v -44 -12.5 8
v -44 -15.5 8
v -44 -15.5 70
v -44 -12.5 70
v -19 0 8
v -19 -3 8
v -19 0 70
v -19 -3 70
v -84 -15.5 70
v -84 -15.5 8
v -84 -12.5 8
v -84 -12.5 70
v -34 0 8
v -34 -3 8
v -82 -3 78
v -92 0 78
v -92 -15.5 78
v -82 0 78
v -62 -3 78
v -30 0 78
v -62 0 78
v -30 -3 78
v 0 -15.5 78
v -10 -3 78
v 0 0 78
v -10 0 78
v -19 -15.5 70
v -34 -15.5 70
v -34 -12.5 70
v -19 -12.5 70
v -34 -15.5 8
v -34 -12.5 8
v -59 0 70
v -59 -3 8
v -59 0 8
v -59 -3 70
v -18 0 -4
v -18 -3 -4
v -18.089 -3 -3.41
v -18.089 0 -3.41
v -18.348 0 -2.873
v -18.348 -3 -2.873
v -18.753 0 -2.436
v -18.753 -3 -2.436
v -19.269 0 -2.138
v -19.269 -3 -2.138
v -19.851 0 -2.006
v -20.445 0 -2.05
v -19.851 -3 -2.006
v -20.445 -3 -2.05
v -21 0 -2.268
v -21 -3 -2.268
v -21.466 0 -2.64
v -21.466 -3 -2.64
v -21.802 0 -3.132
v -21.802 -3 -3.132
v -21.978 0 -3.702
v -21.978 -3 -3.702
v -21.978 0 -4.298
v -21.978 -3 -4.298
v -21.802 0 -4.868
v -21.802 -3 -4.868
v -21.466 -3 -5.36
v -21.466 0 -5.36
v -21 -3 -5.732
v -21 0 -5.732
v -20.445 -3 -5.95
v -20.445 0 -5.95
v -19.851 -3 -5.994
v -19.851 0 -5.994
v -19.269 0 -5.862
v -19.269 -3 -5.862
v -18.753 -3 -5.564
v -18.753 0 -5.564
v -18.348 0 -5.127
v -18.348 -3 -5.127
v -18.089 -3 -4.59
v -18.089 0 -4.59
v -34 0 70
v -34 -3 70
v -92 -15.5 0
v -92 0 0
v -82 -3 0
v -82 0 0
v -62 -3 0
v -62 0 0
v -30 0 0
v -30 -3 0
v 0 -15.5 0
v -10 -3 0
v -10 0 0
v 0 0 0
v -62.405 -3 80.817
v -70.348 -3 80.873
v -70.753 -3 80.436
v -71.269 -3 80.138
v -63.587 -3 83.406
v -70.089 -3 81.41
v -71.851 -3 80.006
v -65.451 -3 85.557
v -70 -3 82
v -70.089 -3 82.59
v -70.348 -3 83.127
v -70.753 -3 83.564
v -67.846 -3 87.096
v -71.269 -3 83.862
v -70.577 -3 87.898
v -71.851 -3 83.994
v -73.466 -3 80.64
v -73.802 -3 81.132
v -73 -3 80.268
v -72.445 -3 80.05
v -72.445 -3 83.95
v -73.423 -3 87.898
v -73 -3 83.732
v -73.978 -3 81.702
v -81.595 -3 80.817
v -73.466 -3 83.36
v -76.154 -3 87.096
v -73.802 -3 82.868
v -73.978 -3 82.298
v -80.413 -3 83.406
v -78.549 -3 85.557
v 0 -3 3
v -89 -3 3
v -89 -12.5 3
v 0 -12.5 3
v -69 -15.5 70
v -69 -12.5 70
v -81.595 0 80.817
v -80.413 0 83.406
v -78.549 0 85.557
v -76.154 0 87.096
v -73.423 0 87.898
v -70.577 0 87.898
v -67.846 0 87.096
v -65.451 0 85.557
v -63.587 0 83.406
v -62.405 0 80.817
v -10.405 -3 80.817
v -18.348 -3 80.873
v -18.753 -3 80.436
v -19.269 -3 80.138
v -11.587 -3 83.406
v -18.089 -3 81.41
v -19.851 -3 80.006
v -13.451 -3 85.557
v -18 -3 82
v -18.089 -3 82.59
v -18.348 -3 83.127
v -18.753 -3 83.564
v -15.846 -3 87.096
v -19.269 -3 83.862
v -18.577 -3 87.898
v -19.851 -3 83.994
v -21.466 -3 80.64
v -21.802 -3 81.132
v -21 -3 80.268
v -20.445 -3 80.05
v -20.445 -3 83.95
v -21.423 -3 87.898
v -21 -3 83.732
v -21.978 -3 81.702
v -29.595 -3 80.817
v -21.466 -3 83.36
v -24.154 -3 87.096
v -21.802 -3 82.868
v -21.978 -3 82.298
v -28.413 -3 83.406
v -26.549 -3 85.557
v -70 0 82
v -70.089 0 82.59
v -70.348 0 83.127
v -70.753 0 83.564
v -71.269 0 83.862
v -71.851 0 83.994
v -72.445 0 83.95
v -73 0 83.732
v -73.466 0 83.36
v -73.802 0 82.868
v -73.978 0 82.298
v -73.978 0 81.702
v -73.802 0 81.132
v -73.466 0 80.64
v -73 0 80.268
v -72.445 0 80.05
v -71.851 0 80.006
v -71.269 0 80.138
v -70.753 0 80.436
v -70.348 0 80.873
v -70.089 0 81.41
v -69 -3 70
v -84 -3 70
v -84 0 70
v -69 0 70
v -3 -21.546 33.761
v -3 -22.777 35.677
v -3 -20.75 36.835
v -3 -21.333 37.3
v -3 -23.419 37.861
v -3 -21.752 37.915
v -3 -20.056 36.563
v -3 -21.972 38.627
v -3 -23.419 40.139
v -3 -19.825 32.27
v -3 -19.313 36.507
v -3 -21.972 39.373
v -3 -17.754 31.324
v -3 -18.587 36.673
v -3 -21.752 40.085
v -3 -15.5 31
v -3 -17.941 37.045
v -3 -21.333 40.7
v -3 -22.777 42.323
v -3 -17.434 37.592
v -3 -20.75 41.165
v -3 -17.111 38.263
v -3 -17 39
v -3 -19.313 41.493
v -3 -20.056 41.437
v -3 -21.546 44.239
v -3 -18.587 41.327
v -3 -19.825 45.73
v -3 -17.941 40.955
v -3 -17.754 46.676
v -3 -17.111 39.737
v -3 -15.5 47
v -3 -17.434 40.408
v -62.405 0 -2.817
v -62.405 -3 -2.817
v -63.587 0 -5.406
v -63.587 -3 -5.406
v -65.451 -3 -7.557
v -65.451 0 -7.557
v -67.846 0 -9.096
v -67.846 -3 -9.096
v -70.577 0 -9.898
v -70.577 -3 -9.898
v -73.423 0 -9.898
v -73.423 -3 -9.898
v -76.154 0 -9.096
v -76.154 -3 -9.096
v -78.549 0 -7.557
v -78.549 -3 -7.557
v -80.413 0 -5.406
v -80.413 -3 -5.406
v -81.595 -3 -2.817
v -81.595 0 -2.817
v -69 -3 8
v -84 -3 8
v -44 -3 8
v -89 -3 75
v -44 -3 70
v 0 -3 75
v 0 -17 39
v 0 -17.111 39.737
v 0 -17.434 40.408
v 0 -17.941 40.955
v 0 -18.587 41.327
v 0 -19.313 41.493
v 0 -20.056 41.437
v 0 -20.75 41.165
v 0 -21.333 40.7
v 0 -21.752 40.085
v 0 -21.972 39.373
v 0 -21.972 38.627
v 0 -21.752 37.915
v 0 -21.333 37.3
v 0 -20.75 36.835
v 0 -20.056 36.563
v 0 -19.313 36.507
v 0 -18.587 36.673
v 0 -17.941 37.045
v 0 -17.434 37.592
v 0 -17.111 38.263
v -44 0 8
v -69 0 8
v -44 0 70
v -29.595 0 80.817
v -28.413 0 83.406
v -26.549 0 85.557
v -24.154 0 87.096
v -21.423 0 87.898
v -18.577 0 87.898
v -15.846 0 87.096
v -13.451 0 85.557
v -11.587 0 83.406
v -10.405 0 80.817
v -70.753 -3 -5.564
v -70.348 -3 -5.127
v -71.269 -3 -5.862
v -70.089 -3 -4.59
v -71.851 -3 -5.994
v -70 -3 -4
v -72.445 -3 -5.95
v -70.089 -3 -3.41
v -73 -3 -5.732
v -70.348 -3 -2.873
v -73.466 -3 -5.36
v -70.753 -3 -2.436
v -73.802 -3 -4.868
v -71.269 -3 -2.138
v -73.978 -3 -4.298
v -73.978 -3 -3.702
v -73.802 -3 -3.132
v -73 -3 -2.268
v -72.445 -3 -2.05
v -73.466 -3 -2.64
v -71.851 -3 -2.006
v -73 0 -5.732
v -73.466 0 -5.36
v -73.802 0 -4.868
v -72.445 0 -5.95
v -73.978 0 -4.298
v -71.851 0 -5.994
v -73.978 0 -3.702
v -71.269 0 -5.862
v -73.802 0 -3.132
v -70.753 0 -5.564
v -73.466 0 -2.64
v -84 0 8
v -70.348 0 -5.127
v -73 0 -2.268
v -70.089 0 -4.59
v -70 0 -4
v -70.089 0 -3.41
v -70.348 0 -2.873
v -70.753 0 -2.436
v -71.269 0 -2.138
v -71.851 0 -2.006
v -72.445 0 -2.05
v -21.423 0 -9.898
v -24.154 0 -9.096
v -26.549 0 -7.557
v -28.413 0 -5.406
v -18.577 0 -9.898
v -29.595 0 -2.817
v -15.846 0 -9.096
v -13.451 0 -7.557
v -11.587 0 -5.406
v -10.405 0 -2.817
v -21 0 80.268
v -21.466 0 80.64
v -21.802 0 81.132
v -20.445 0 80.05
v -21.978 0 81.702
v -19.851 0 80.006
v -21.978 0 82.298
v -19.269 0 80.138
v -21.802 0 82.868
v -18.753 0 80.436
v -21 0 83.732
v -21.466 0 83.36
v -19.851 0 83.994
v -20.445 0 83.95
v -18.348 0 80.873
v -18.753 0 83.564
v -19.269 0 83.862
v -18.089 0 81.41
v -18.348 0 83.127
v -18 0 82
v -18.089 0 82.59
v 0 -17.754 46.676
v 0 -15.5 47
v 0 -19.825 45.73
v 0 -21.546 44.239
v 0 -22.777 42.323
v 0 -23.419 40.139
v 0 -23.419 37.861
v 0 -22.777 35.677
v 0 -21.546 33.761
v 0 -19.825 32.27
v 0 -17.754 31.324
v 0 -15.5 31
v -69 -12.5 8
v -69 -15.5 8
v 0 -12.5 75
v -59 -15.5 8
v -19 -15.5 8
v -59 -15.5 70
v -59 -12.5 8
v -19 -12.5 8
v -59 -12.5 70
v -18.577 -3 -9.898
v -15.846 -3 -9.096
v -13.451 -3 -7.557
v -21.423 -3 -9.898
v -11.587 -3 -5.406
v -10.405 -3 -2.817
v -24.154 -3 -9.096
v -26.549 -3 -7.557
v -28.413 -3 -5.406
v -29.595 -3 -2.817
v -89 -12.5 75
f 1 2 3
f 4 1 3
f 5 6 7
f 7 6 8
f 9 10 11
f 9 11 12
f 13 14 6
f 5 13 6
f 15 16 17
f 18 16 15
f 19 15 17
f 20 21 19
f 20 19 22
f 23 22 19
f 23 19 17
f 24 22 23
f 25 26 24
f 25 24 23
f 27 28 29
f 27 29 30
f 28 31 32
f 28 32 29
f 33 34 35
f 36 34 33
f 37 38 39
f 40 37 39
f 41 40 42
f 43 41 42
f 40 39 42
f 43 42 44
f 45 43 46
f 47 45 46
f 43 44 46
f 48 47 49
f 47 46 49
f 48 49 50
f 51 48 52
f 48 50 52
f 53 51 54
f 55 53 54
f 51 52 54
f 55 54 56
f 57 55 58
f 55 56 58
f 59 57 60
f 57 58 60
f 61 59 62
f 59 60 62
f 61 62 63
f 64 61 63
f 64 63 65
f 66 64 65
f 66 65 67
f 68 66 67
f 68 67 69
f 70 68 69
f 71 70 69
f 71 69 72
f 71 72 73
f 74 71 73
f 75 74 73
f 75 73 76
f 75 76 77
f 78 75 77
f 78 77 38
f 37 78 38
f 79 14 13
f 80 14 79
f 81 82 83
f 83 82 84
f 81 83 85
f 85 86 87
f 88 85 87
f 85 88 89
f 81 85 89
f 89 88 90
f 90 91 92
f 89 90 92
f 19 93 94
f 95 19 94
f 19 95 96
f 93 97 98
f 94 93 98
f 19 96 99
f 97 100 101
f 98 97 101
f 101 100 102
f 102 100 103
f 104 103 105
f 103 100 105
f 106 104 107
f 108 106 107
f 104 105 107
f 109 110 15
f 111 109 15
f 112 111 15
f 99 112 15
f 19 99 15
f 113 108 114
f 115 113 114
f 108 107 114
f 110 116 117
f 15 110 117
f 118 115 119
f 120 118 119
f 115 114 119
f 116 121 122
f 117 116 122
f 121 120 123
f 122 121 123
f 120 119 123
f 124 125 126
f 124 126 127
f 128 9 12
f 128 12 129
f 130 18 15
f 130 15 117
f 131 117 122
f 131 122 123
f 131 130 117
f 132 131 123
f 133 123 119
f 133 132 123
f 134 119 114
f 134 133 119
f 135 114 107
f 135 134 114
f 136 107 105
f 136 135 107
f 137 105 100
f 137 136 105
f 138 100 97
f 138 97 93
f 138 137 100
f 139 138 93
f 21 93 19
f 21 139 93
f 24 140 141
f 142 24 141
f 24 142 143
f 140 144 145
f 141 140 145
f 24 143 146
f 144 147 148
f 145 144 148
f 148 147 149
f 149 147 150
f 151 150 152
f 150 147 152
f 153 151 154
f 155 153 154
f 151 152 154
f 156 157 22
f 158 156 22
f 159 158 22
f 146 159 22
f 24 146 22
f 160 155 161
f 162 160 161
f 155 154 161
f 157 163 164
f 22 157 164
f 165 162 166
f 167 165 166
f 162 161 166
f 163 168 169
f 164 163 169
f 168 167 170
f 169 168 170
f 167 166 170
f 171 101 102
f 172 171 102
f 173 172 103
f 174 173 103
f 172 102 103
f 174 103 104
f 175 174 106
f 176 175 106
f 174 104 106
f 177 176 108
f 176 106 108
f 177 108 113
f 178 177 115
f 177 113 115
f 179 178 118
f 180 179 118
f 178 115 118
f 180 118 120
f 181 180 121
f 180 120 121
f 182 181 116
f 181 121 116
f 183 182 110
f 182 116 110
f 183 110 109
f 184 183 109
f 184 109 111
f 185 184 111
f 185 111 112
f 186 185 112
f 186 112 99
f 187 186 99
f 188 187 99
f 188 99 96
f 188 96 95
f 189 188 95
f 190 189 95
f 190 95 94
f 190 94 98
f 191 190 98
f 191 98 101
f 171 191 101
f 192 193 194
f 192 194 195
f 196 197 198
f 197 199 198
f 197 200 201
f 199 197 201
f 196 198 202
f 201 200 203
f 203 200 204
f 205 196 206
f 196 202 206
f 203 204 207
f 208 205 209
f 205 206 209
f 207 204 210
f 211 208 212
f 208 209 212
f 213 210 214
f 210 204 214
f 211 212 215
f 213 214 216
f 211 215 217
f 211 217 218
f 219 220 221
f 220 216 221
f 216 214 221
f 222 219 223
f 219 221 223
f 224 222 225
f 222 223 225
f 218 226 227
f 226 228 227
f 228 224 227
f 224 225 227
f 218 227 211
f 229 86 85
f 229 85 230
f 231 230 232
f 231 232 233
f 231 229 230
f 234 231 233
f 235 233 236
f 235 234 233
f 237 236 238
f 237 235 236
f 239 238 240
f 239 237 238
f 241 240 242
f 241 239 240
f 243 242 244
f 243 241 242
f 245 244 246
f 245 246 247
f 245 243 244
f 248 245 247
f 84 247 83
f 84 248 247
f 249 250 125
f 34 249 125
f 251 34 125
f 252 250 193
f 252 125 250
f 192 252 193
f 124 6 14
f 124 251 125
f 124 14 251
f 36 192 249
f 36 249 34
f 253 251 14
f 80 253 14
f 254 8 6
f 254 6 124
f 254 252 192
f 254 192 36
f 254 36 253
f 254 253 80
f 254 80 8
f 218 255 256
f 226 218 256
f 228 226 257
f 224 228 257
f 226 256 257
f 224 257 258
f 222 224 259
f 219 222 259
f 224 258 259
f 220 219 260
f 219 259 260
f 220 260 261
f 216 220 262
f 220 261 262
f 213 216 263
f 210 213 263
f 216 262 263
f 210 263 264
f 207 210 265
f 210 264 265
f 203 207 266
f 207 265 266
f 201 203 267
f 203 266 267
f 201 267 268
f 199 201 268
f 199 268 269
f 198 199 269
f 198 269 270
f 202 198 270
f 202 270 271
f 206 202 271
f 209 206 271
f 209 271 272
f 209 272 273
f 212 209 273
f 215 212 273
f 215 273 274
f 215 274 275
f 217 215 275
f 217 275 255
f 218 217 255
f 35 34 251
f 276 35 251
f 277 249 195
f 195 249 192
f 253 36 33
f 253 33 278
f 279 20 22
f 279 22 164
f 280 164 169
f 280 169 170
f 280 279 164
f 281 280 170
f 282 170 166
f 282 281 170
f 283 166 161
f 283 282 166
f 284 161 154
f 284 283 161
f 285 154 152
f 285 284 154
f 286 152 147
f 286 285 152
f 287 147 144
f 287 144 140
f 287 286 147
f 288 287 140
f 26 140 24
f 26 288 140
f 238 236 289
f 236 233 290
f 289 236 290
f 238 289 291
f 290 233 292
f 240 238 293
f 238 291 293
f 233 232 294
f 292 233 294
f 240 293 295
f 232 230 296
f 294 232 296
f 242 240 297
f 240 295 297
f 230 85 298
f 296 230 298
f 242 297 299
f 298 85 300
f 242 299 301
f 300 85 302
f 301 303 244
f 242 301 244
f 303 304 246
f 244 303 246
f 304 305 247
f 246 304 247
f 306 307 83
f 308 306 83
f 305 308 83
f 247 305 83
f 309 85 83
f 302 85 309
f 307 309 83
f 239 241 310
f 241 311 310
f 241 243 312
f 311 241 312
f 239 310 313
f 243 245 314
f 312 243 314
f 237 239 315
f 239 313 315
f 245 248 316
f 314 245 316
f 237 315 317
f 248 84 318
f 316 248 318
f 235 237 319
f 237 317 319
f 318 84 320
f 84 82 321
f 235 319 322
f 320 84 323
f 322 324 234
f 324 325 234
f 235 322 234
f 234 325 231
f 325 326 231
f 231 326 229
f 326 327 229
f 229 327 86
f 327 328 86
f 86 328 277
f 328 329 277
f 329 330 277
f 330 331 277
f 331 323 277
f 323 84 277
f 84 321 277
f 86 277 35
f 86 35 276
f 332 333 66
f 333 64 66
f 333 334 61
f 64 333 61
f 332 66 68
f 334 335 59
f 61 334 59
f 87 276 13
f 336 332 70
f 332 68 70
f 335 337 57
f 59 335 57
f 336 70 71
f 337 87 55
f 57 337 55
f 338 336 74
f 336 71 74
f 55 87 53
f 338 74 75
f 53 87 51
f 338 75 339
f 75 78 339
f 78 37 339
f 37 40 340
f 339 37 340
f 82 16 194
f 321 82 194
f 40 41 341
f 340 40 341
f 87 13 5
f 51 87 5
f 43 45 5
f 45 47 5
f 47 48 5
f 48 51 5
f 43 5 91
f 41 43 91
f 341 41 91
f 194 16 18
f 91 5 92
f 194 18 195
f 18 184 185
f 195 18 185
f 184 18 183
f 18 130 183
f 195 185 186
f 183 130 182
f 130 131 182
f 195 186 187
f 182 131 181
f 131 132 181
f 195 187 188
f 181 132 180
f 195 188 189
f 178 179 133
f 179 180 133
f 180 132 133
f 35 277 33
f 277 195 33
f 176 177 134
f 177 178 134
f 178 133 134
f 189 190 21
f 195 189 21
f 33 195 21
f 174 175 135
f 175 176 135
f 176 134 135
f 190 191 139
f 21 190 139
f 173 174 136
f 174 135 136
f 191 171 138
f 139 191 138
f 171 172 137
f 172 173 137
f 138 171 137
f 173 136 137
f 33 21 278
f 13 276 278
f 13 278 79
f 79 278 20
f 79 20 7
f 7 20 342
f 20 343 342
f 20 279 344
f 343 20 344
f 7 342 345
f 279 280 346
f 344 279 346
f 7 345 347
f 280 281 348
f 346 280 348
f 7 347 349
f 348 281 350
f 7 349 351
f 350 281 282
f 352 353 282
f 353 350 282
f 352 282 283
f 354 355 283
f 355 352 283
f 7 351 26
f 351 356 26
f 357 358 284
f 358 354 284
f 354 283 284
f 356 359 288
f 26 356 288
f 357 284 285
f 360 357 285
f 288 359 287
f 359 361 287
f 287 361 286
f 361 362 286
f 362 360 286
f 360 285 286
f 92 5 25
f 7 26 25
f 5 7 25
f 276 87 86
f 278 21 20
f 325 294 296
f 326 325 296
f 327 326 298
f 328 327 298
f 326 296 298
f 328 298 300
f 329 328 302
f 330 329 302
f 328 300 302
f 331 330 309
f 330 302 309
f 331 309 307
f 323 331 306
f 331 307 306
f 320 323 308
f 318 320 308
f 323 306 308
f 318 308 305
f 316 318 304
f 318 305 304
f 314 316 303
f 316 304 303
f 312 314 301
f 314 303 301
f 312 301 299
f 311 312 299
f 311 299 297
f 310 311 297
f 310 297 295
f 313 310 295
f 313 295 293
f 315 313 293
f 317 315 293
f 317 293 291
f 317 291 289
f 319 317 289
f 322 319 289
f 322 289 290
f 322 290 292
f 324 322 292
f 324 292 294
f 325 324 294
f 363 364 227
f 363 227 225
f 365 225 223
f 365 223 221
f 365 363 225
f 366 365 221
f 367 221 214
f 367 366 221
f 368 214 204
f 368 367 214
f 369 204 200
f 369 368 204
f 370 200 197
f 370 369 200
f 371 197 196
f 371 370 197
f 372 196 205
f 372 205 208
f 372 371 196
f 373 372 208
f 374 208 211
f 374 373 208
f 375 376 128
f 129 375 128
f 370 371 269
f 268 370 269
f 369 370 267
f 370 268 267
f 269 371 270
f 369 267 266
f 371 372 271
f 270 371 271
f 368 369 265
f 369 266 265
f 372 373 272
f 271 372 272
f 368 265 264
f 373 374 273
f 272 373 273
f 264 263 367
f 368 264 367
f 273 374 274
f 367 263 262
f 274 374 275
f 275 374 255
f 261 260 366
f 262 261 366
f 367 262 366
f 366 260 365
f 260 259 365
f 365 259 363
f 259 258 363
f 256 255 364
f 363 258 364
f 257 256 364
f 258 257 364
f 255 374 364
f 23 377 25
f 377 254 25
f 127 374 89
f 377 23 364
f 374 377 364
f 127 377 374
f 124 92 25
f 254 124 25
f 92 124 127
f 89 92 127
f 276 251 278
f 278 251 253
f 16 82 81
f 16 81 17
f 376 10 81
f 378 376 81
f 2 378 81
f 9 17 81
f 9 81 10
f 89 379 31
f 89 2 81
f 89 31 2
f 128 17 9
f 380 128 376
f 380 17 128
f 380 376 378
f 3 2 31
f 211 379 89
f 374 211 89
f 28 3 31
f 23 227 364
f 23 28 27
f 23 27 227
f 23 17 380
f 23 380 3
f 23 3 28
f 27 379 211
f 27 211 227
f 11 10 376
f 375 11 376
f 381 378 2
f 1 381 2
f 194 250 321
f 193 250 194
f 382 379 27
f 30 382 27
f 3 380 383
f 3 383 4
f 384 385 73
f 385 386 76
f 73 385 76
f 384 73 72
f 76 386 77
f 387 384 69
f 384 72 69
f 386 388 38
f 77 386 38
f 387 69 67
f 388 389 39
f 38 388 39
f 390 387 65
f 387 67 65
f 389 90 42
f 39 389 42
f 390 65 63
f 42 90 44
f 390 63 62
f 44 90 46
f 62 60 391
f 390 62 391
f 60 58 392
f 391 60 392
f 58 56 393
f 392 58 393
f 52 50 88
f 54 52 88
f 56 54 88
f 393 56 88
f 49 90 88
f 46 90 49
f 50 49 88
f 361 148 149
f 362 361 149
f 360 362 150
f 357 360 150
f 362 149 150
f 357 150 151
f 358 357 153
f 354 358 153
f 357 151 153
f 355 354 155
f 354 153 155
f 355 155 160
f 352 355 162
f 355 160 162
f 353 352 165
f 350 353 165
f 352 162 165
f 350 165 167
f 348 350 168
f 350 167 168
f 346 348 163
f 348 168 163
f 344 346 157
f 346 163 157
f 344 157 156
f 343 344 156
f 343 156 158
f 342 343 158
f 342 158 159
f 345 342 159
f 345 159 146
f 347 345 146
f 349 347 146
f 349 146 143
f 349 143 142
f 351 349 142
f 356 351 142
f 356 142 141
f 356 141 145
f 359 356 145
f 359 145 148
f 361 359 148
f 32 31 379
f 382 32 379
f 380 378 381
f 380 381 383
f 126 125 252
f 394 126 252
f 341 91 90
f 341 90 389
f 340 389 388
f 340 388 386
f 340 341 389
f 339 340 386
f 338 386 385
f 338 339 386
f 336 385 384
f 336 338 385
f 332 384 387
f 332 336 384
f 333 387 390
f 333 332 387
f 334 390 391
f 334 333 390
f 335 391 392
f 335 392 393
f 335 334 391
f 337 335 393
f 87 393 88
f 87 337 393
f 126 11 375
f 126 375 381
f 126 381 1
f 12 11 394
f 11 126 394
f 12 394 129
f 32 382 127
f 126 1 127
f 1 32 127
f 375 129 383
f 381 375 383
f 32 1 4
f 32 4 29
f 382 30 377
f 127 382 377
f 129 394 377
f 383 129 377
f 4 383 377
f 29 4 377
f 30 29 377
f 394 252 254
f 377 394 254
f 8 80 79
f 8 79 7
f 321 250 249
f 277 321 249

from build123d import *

# Parameters (mm, degrees)
F0_W      = 92
F0_H      = 78
F1_DEPTH  = 15.5
F2_T      = -3
F4_DEPTH  = 3
F5_R      = 2
F6_DEPTH  = 25
F7_W      = 15
F7_H      = 62
F8_DEPTH  = 25
F10_DEPTH = 3
F11_R     = 2.5
F12_DEPTH = 5


# Not quite as in the source:
# - a feature names something its author has since deleted; it is built from what else it names


with BuildPart() as f1:
    # F0 (on Front) → F1 (new body)
    with BuildSketch(Plane.XZ):
        with Locations((-46, 39)):
            Rectangle(F0_W, F0_H)
    extrude(amount=F1_DEPTH)

    # F2
    f2_openings = [f1.faces().sort_by_distance(p)[0] for p in [
        (0, -7.75, 39),
    ]]
    offset(amount=F2_T, openings=f2_openings)

    # F3 (on face) → F4 (join)
    with BuildSketch(Plane(origin=(0, 0, 0), x_dir=(-1, 0, 0), z_dir=(0, 1, 0))):
        with BuildLine():
            Line((62, 78), (82, 78))
            ThreePointArc((82, 78), (72, 88), (62, 78))
        make_face()
        with BuildLine():
            ThreePointArc((62, 0), (72, -10), (82, 0))
            Line((82, 0), (62, 0))
        make_face()
        with BuildLine():
            Line((10, 78), (30, 78))
            ThreePointArc((30, 78), (20, 88), (10, 78))
        make_face()
        with BuildLine():
            ThreePointArc((10, 0), (20, -10), (30, 0))
            Line((30, 0), (10, 0))
        make_face()
    extrude(amount=-F4_DEPTH)

    # F5 (on face) → F6 (cut)
    with BuildSketch(Plane.XZ.offset(3)):
        with Locations((-72, 82)):
            Circle(F5_R)
        with Locations((-72, -4)):
            Circle(F5_R)
        with Locations((-20, 82)):
            Circle(F5_R)
        with Locations((-20, -4)):
            Circle(F5_R)
    extrude(amount=-F6_DEPTH, mode=Mode.SUBTRACT)

    # F7 (on face) → F8 (cut)
    with BuildSketch(Plane.XZ.offset(15.5)):
        with Locations((-76.5, 39)):
            Rectangle(F7_W, F7_H)
        with Locations((-51.5, 39)):
            Rectangle(F7_W, F7_H)
        with Locations((-26.5, 39)):
            Rectangle(F7_W, F7_H)
    extrude(amount=-F8_DEPTH, mode=Mode.SUBTRACT)

    # F9 (on face) → F10 (join)
    with BuildSketch(Plane.YZ):
        with BuildLine():
            Line((-15.5, 31), (-15.5, 47))
            ThreePointArc((-15.5, 47), (-23.5, 39), (-15.5, 31))
        make_face()
    extrude(amount=-F10_DEPTH)

    # F11 (on face) → F12 (cut)
    with BuildSketch(Plane.YZ):
        with Locations((-19.5, 39)):
            Circle(F11_R)
    extrude(amount=-F12_DEPTH, mode=Mode.SUBTRACT)


solid = f1.part
